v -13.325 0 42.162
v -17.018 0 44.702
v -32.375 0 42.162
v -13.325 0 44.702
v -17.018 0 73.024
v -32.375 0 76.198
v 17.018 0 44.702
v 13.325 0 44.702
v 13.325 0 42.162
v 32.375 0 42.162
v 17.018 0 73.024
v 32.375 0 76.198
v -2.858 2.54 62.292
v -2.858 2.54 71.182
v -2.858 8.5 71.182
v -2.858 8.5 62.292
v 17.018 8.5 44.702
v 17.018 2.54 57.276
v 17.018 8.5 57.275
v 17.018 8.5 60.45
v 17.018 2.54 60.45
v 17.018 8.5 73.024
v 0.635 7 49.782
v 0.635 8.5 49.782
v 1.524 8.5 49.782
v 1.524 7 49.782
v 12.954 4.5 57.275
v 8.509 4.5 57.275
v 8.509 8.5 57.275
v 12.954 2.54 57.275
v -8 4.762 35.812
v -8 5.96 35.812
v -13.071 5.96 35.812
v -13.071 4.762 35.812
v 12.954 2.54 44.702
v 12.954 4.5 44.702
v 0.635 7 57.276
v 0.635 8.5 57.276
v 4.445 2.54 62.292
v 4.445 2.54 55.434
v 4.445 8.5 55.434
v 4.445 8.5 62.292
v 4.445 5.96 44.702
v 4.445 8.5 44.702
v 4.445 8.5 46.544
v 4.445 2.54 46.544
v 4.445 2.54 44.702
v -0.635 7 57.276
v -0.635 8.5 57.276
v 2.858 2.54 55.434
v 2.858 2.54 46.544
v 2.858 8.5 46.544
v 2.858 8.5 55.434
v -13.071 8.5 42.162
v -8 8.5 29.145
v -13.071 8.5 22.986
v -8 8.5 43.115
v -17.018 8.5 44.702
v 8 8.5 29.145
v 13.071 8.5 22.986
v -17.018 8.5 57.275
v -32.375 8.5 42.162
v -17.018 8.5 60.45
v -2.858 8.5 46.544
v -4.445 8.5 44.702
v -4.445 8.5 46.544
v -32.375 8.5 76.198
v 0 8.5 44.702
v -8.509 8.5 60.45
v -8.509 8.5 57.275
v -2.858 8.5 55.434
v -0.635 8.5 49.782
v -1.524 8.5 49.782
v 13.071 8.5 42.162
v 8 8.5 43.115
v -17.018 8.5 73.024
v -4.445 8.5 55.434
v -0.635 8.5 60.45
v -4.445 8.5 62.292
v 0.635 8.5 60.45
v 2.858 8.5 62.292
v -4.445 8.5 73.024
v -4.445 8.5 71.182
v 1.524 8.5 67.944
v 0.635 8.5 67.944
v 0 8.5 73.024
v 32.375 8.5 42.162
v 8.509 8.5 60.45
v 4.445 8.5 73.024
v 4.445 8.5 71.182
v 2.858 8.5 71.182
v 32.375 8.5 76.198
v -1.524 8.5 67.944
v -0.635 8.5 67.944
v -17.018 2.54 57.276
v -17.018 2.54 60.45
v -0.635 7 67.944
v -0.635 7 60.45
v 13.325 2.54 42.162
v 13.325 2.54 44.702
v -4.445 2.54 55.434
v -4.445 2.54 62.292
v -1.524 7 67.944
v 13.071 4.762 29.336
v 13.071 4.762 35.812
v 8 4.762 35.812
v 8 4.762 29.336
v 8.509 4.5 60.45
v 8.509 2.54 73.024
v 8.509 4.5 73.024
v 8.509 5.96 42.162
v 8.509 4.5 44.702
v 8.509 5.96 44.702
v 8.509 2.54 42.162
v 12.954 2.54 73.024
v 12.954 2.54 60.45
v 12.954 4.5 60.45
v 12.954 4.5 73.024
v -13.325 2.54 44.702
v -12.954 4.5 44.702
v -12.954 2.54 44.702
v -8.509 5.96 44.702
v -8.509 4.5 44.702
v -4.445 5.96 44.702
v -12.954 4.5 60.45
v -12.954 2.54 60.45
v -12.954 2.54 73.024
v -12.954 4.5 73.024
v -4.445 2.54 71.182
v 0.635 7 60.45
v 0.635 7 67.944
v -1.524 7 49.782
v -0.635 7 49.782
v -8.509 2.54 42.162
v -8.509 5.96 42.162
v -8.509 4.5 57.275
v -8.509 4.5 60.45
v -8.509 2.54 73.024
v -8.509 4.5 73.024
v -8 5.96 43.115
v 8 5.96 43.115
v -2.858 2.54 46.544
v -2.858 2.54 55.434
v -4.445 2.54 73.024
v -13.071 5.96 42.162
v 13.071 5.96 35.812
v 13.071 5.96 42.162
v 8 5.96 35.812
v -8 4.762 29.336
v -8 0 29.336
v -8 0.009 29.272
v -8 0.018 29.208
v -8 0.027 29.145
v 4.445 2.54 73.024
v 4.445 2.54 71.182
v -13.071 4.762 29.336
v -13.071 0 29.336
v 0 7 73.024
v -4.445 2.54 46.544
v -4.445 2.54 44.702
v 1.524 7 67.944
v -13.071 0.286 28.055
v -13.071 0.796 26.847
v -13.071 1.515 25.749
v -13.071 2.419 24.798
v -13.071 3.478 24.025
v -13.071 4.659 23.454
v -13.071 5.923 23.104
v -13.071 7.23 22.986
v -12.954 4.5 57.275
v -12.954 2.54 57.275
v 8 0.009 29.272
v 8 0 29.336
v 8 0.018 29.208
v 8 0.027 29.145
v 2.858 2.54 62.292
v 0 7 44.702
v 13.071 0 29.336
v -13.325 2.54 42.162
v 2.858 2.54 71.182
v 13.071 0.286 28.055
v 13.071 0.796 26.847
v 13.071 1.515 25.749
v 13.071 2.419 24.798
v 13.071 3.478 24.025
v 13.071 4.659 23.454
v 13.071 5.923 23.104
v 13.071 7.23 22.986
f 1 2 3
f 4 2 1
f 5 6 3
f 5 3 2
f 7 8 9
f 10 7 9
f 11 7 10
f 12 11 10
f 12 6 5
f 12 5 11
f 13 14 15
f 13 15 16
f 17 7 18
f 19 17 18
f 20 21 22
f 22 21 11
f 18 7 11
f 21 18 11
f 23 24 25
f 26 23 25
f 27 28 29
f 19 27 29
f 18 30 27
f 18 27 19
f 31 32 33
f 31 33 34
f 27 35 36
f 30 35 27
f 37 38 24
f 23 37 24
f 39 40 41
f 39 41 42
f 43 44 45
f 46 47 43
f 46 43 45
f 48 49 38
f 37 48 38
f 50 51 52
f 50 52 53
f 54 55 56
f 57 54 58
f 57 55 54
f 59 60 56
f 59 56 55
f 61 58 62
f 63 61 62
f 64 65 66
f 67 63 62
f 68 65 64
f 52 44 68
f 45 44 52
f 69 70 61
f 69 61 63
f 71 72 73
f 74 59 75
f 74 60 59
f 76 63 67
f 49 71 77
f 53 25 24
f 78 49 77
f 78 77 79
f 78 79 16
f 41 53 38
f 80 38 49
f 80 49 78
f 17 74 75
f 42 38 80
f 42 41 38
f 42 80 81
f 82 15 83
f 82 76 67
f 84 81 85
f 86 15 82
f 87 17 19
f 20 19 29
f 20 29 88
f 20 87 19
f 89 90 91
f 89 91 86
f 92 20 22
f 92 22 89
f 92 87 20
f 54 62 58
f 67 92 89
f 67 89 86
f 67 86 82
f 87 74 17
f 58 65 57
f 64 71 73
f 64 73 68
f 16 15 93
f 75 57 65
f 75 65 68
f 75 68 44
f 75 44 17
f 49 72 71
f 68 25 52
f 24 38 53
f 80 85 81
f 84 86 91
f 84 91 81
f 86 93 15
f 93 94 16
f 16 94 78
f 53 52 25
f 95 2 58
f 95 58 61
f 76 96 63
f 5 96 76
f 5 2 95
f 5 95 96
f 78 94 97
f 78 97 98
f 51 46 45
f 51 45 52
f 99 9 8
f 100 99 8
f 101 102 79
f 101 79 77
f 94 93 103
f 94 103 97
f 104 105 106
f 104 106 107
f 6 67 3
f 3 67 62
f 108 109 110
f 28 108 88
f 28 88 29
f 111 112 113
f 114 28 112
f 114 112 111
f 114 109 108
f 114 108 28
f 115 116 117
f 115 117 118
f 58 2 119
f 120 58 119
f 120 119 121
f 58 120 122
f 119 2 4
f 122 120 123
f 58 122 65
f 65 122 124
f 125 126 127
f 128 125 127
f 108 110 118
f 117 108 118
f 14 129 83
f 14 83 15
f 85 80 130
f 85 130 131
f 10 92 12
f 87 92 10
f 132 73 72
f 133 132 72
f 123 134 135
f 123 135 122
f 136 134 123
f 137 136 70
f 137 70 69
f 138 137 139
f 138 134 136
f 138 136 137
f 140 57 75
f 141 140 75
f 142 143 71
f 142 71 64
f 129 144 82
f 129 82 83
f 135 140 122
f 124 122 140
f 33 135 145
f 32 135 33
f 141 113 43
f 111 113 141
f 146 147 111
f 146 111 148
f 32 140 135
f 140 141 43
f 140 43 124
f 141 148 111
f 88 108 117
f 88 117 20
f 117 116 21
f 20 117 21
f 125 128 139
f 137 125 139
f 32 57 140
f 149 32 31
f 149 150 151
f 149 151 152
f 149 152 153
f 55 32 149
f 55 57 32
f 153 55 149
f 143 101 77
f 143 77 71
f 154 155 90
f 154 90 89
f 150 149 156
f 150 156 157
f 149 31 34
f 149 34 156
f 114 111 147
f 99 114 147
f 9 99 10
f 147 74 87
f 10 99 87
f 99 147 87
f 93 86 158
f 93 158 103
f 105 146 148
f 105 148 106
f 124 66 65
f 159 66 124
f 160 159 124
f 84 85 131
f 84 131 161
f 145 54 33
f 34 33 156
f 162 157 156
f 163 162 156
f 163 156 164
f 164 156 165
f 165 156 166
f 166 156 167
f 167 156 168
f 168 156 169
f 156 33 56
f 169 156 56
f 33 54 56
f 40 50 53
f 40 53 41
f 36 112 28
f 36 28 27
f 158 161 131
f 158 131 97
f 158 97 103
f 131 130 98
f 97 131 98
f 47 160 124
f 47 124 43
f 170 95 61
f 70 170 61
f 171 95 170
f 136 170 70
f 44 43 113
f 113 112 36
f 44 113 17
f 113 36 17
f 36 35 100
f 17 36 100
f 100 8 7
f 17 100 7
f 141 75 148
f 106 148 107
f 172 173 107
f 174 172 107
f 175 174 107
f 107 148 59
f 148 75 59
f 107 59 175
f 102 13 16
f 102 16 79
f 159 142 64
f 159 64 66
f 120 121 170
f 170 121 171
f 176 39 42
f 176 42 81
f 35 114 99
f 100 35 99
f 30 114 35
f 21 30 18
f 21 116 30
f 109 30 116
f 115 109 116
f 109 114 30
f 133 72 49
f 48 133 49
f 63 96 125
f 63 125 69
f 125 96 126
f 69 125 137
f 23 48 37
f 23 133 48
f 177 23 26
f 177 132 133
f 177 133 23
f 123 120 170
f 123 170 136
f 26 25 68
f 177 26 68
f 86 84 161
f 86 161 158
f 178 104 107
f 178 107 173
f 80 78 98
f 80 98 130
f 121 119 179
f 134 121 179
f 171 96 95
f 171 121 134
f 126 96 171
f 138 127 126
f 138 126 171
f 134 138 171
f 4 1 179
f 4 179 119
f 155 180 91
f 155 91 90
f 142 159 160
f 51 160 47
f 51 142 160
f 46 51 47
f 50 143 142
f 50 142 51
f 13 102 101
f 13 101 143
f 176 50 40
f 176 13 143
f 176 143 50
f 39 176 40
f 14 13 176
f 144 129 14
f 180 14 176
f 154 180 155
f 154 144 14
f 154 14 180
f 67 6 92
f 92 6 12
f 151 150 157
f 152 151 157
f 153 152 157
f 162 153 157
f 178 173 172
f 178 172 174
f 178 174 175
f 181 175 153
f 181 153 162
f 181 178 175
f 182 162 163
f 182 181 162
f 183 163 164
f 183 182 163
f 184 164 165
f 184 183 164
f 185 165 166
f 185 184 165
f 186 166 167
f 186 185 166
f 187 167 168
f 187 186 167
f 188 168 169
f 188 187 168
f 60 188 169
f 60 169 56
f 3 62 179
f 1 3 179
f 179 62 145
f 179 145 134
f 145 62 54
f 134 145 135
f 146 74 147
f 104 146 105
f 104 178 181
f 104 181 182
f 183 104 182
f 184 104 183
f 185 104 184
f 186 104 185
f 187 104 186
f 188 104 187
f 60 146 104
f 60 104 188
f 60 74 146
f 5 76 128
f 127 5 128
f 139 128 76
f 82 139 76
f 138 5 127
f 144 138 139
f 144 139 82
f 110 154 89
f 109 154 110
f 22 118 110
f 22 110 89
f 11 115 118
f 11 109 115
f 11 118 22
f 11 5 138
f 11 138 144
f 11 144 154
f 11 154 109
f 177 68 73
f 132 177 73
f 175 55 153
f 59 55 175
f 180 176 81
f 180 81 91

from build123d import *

# Parameters (mm, degrees)
SKETCH1_W               = 64.75
SKETCH1_H               = 84.325
SKETCH1_R               = 1.35
BOSS_EXTRUDE1_DEPTH     = 25.4
CUT_EXTRUDE1_DEPTH      = 65.75
SKETCH5_W               = 58.925
SKETCH5_H               = 20.6375
CUT_EXTRUDE3_DEPTH      = 65.75
BOSS_EXTRUDE2_START     = 4.7625
SKETCH1_3_W             = 6.75
SKETCH1_3_H             = 6.75
SKETCH1_3_R             = 1.35
SKETCH1_3_H_2           = 3.175
BOSS_EXTRUDE2_DEPTH     = 6.35
SKETCH7_W               = 26.65
SKETCH7_H               = 58.925
CUT_EXTRUDE6_DEPTH      = 13.7
CUT_EXTRUDE6_DEPTH_BACK = 13.7
SKETCH8_W               = 64.75
SKETCH8_H               = 34.036
SKETCH8_W_2             = 4.064
SKETCH8_H_2             = 12.573
BOSS_EXTRUDE3_DEPTH     = 8.5
CUT_EXTRUDE7_START      = -8.5
SKETCH8_3_W             = 4.445
SKETCH8_3_H             = 12.573
CUT_EXTRUDE7_DEPTH      = 4
SKETCH8_4_W             = 4.445
SKETCH8_4_H             = 12.573
CUT_EXTRUDE8_DEPTH      = 2.54
SKETCH9_W               = 26.65
SKETCH9_H               = 86.865
SKETCH9_W_2             = 8.509
SKETCH9_H_2             = 3.175
CUT_EXTRUDE9_DEPTH      = 2.54
CUT_EXTRUDE10_DEPTH     = 1.5
SKETCH11_W              = 64.75
SKETCH11_H              = 84.325
CUT_EXTRUDE11_DEPTH     = 26.4
BOSS_EXTRUDE4_DEPTH     = 64.75
SKETCH15_W              = 19.304
SKETCH15_H              = 19.177
SKETCH15_W_2            = 16
SKETCH15_H_2            = 13.97
CUT_EXTRUDE12_DEPTH     = 9.5
SKETCH17_W              = 17.018
SKETCH17_H              = 2.54
CUT_EXTRUDE13_DEPTH     = 5.96


with BuildPart() as part:
    # Sketch1 → Boss-Extrude1 (new body)
    with BuildSketch(Plane(origin=(0, 0, 0), x_dir=(1, 0, 0), z_dir=(0, 1, 0))):
        Rectangle(SKETCH1_W, SKETCH1_H)
        with Locations((-29, 10.2125)):
            Circle(SKETCH1_R, mode=Mode.SUBTRACT)
        with Locations((-29, -38.7875)):
            Circle(SKETCH1_R, mode=Mode.SUBTRACT)
        with Locations((29, 10.2125)):
            Circle(SKETCH1_R, mode=Mode.SUBTRACT)
        with Locations((29, -38.7875)):
            Circle(SKETCH1_R, mode=Mode.SUBTRACT)
    extrude(amount=BOSS_EXTRUDE1_DEPTH)

    # Sketch3 → Cut-Extrude1 (cut, through all)
    with BuildSketch(Plane(origin=(32.375, 0, 0), x_dir=(0, 0, -1), z_dir=(1, 0, 0))):
        Polygon((42.1625, 18.034), (23.1125, 18.669), (23.1125, 12.7), (42.1625, 12.7), align=None)
    extrude(amount=-CUT_EXTRUDE1_DEPTH, mode=Mode.SUBTRACT)

    # Sketch5 → Cut-Extrude3 (cut, through all)
    with BuildSketch(Plane(origin=(32.375, 0, 0), x_dir=(0, 0, -1), z_dir=(1, 0, 0))):
        with Locations((-12.7, 15.08125)):
            Rectangle(SKETCH5_W, SKETCH5_H)
    extrude(amount=-CUT_EXTRUDE3_DEPTH, mode=Mode.SUBTRACT)

    # Sketch1<3> → Boss-Extrude2 (add)
    with BuildSketch(Plane(origin=(0, 0, 0), x_dir=(1, 0, 0), z_dir=(0, 1, 0)).offset(BOSS_EXTRUDE2_START)):
        with Locations((29, -38.7875)):
            Rectangle(SKETCH1_3_W, SKETCH1_3_H)
        with Locations((29, -38.7875)):
            Circle(SKETCH1_3_R, mode=Mode.SUBTRACT)
        with Locations((-29, -38.7875)):
            Rectangle(SKETCH1_3_W, SKETCH1_3_H)
        with Locations((-29, -38.7875)):
            Circle(SKETCH1_3_R, mode=Mode.SUBTRACT)
        with Locations((-29, 10.2125)):
            Rectangle(SKETCH1_3_W, SKETCH1_3_H)
        with Locations((-29, 10.2125)):
            Circle(SKETCH1_3_R, mode=Mode.SUBTRACT)
        with Locations((29, 10.2125)):
            Rectangle(SKETCH1_3_W, SKETCH1_3_H)
        with Locations((29, 10.2125)):
            Circle(SKETCH1_3_R, mode=Mode.SUBTRACT)
        with Locations((-29, 15.175)):
            Rectangle(SKETCH1_3_W, SKETCH1_3_H_2)
        with Locations((29, 15.175)):
            Rectangle(SKETCH1_3_W, SKETCH1_3_H_2)
    extrude(amount=BOSS_EXTRUDE2_DEPTH)

    # Sketch7 → Cut-Extrude6 (cut, two sides)
    with BuildSketch(Plane(origin=(0, 12.7, 0), x_dir=(1, 0, 0), z_dir=(0, 1, 0))) as cut_extrude6_sk:
        Rectangle(SKETCH7_W, SKETCH7_H)
    extrude(amount=CUT_EXTRUDE6_DEPTH, mode=Mode.SUBTRACT)
    extrude(cut_extrude6_sk.sketch, amount=-CUT_EXTRUDE6_DEPTH_BACK, mode=Mode.SUBTRACT)

    # Sketch8 → Boss-Extrude3 (add)
    with BuildSketch(Plane.XZ):
        with Locations((0, 59.1805)):
            Rectangle(SKETCH8_W, SKETCH8_H)
        with Locations((-14.986, 50.989)):
            Rectangle(SKETCH8_W_2, SKETCH8_H_2, mode=Mode.SUBTRACT)
        with Locations((-14.986, 66.737)):
            Rectangle(SKETCH8_W_2, SKETCH8_H_2, mode=Mode.SUBTRACT)
        Polygon((-8.509, 73.0235), (-4.445, 73.0235), (-4.445, 71.182), (-2.8575, 71.182), (-2.8575, 62.292), (-4.445, 62.292), (-4.445, 55.434), (-2.8575, 55.434), (-2.8575, 46.544), (-4.445, 46.544), (-4.445, 44.7025), (-8.509, 44.7025), align=None, mode=Mode.SUBTRACT)
        Polygon((4.445, 73.0235), (8.509, 73.0235), (8.509, 44.7025), (4.445, 44.7025), (4.445, 46.544), (2.8575, 46.544), (2.8575, 55.434), (4.445, 55.434), (4.445, 62.292), (2.8575, 62.292), (2.8575, 71.182), (4.445, 71.182), align=None, mode=Mode.SUBTRACT)
        with Locations((14.986, 66.737)):
            Rectangle(SKETCH8_W_2, SKETCH8_H_2, mode=Mode.SUBTRACT)
        with Locations((14.986, 50.989)):
            Rectangle(SKETCH8_W_2, SKETCH8_H_2, mode=Mode.SUBTRACT)
    extrude(amount=-BOSS_EXTRUDE3_DEPTH)

    # Sketch8<3> → Cut-Extrude7 (cut)
    with BuildSketch(Plane.XZ.offset(CUT_EXTRUDE7_START)):
        with Locations((-10.7315, 50.989)):
            Rectangle(SKETCH8_3_W, SKETCH8_3_H)
        with Locations((10.7315, 50.989)):
            Rectangle(SKETCH8_3_W, SKETCH8_3_H)
        with Locations((-10.7315, 66.737)):
            Rectangle(SKETCH8_3_W, SKETCH8_3_H)
        with Locations((10.7315, 66.737)):
            Rectangle(SKETCH8_3_W, SKETCH8_3_H)
    extrude(amount=CUT_EXTRUDE7_DEPTH, mode=Mode.SUBTRACT)

    # Sketch8<4> → Cut-Extrude8 (cut)
    with BuildSketch(Plane.XZ):
        with Locations((10.7315, 50.989)):
            Rectangle(SKETCH8_4_W, SKETCH8_4_H)
        with Locations((-10.7315, 50.989)):
            Rectangle(SKETCH8_4_W, SKETCH8_4_H)
        with Locations((10.7315, 66.737)):
            Rectangle(SKETCH8_4_W, SKETCH8_4_H)
        with Locations((-10.7315, 66.737)):
            Rectangle(SKETCH8_4_W, SKETCH8_4_H)
        Polygon((-4.445, 46.544), (-4.445, 44.7025), (4.445, 44.7025), (4.445, 46.544), (2.8575, 46.544), (2.8575, 49.084), (2.8575, 52.894), (2.8575, 55.434), (4.445, 55.434), (4.445, 57.2755), (4.445, 60.4505), (4.445, 62.292), (2.8575, 62.292), (2.8575, 64.832), (2.8575, 68.642), (2.8575, 71.182), (4.445, 71.182), (4.445, 73.0235), (-4.445, 73.0235), (-4.445, 71.182), (-2.8575, 71.182), (-2.8575, 68.642), (-2.8575, 64.832), (-2.8575, 62.292), (-4.445, 62.292), (-4.445, 60.4505), (-4.445, 57.2755), (-4.445, 55.434), (-2.8575, 55.434), (-2.8575, 52.894), (-2.8575, 49.084), (-2.8575, 46.544), align=None)
    extrude(amount=-CUT_EXTRUDE8_DEPTH, mode=Mode.SUBTRACT)

    # Sketch9 → Cut-Extrude9 (cut)
    with BuildSketch(Plane.XZ):
        with Locations((0, 1.27)):
            Rectangle(SKETCH9_W, SKETCH9_H)
        with Locations((-12.7635, 58.863)):
            Rectangle(SKETCH9_W_2, SKETCH9_H_2)
        with Locations((12.7635, 58.863)):
            Rectangle(SKETCH9_W_2, SKETCH9_H_2)
    extrude(amount=-CUT_EXTRUDE9_DEPTH, mode=Mode.SUBTRACT)

    # Sketch10 → Cut-Extrude10 (cut)
    with BuildSketch(Plane(origin=(0, 8.5, 0), x_dir=(1, 0, 0), z_dir=(0, 1, 0))):
        Polygon((-0.635, -57.2755), (0.635, -57.2755), (0.635, -49.7825), (1.524, -49.7825), (0, -44.7025), (-1.524, -49.7825), (-0.635, -49.7825), align=None)
        Polygon((-0.635, -67.9435), (-0.635, -60.4505), (0.635, -60.4505), (0.635, -67.9435), (1.524, -67.9435), (0, -73.0235), (-1.524, -67.9435), align=None)
    extrude(amount=-CUT_EXTRUDE10_DEPTH, mode=Mode.SUBTRACT)

    # Sketch11 → Cut-Extrude11 (cut, through all)
    with BuildSketch(Plane.XZ):
        Rectangle(SKETCH11_W, SKETCH11_H)
    extrude(amount=-CUT_EXTRUDE11_DEPTH, mode=Mode.SUBTRACT)

    # Sketch14 → Boss-Extrude4 (add)
    with BuildSketch(Plane(origin=(32.375, 0, 0), x_dir=(0, 0, -1), z_dir=(1, 0, 0))):
        with BuildLine():
            Line((-22.9855, 8.5), (-42.1625, 8.5))
            Line((-42.1625, 8.5), (-42.1625, 5.96))
            Line((-42.1625, 5.96), (-35.8125, 5.96))
            Line((-35.8125, 5.96), (-35.8125, 4.7625))
            Line((-35.8125, 4.7625), (-29.3355, 4.7625))
            Line((-29.3355, 4.7625), (-29.3355, 0))
            ThreePointArc((-29.3355, 0), (-24.798384872, 2.418674819), (-22.9855, 7.23))
            Line((-22.9855, 7.23), (-22.9855, 8.5))
        make_face()
    extrude(amount=-BOSS_EXTRUDE4_DEPTH)

    # Sketch15 → Cut-Extrude12 (cut, through all)
    with BuildSketch(Plane(origin=(0, 8.5, 0), x_dir=(1, 0, 0), z_dir=(0, 1, 0))):
        with Locations((-22.723, -32.574)):
            Rectangle(SKETCH15_W, SKETCH15_H)
        with Locations((0, -36.13)):
            Rectangle(SKETCH15_W_2, SKETCH15_H_2)
        with Locations((22.723, -32.574)):
            Rectangle(SKETCH15_W, SKETCH15_H)
    extrude(amount=-CUT_EXTRUDE12_DEPTH, mode=Mode.SUBTRACT)

    # Sketch17 → Cut-Extrude13 (cut)
    with BuildSketch(Plane.XZ):
        with Locations((0, 43.4325)):
            Rectangle(SKETCH17_W, SKETCH17_H)
    extrude(amount=-CUT_EXTRUDE13_DEPTH, mode=Mode.SUBTRACT)


solid = part.part
